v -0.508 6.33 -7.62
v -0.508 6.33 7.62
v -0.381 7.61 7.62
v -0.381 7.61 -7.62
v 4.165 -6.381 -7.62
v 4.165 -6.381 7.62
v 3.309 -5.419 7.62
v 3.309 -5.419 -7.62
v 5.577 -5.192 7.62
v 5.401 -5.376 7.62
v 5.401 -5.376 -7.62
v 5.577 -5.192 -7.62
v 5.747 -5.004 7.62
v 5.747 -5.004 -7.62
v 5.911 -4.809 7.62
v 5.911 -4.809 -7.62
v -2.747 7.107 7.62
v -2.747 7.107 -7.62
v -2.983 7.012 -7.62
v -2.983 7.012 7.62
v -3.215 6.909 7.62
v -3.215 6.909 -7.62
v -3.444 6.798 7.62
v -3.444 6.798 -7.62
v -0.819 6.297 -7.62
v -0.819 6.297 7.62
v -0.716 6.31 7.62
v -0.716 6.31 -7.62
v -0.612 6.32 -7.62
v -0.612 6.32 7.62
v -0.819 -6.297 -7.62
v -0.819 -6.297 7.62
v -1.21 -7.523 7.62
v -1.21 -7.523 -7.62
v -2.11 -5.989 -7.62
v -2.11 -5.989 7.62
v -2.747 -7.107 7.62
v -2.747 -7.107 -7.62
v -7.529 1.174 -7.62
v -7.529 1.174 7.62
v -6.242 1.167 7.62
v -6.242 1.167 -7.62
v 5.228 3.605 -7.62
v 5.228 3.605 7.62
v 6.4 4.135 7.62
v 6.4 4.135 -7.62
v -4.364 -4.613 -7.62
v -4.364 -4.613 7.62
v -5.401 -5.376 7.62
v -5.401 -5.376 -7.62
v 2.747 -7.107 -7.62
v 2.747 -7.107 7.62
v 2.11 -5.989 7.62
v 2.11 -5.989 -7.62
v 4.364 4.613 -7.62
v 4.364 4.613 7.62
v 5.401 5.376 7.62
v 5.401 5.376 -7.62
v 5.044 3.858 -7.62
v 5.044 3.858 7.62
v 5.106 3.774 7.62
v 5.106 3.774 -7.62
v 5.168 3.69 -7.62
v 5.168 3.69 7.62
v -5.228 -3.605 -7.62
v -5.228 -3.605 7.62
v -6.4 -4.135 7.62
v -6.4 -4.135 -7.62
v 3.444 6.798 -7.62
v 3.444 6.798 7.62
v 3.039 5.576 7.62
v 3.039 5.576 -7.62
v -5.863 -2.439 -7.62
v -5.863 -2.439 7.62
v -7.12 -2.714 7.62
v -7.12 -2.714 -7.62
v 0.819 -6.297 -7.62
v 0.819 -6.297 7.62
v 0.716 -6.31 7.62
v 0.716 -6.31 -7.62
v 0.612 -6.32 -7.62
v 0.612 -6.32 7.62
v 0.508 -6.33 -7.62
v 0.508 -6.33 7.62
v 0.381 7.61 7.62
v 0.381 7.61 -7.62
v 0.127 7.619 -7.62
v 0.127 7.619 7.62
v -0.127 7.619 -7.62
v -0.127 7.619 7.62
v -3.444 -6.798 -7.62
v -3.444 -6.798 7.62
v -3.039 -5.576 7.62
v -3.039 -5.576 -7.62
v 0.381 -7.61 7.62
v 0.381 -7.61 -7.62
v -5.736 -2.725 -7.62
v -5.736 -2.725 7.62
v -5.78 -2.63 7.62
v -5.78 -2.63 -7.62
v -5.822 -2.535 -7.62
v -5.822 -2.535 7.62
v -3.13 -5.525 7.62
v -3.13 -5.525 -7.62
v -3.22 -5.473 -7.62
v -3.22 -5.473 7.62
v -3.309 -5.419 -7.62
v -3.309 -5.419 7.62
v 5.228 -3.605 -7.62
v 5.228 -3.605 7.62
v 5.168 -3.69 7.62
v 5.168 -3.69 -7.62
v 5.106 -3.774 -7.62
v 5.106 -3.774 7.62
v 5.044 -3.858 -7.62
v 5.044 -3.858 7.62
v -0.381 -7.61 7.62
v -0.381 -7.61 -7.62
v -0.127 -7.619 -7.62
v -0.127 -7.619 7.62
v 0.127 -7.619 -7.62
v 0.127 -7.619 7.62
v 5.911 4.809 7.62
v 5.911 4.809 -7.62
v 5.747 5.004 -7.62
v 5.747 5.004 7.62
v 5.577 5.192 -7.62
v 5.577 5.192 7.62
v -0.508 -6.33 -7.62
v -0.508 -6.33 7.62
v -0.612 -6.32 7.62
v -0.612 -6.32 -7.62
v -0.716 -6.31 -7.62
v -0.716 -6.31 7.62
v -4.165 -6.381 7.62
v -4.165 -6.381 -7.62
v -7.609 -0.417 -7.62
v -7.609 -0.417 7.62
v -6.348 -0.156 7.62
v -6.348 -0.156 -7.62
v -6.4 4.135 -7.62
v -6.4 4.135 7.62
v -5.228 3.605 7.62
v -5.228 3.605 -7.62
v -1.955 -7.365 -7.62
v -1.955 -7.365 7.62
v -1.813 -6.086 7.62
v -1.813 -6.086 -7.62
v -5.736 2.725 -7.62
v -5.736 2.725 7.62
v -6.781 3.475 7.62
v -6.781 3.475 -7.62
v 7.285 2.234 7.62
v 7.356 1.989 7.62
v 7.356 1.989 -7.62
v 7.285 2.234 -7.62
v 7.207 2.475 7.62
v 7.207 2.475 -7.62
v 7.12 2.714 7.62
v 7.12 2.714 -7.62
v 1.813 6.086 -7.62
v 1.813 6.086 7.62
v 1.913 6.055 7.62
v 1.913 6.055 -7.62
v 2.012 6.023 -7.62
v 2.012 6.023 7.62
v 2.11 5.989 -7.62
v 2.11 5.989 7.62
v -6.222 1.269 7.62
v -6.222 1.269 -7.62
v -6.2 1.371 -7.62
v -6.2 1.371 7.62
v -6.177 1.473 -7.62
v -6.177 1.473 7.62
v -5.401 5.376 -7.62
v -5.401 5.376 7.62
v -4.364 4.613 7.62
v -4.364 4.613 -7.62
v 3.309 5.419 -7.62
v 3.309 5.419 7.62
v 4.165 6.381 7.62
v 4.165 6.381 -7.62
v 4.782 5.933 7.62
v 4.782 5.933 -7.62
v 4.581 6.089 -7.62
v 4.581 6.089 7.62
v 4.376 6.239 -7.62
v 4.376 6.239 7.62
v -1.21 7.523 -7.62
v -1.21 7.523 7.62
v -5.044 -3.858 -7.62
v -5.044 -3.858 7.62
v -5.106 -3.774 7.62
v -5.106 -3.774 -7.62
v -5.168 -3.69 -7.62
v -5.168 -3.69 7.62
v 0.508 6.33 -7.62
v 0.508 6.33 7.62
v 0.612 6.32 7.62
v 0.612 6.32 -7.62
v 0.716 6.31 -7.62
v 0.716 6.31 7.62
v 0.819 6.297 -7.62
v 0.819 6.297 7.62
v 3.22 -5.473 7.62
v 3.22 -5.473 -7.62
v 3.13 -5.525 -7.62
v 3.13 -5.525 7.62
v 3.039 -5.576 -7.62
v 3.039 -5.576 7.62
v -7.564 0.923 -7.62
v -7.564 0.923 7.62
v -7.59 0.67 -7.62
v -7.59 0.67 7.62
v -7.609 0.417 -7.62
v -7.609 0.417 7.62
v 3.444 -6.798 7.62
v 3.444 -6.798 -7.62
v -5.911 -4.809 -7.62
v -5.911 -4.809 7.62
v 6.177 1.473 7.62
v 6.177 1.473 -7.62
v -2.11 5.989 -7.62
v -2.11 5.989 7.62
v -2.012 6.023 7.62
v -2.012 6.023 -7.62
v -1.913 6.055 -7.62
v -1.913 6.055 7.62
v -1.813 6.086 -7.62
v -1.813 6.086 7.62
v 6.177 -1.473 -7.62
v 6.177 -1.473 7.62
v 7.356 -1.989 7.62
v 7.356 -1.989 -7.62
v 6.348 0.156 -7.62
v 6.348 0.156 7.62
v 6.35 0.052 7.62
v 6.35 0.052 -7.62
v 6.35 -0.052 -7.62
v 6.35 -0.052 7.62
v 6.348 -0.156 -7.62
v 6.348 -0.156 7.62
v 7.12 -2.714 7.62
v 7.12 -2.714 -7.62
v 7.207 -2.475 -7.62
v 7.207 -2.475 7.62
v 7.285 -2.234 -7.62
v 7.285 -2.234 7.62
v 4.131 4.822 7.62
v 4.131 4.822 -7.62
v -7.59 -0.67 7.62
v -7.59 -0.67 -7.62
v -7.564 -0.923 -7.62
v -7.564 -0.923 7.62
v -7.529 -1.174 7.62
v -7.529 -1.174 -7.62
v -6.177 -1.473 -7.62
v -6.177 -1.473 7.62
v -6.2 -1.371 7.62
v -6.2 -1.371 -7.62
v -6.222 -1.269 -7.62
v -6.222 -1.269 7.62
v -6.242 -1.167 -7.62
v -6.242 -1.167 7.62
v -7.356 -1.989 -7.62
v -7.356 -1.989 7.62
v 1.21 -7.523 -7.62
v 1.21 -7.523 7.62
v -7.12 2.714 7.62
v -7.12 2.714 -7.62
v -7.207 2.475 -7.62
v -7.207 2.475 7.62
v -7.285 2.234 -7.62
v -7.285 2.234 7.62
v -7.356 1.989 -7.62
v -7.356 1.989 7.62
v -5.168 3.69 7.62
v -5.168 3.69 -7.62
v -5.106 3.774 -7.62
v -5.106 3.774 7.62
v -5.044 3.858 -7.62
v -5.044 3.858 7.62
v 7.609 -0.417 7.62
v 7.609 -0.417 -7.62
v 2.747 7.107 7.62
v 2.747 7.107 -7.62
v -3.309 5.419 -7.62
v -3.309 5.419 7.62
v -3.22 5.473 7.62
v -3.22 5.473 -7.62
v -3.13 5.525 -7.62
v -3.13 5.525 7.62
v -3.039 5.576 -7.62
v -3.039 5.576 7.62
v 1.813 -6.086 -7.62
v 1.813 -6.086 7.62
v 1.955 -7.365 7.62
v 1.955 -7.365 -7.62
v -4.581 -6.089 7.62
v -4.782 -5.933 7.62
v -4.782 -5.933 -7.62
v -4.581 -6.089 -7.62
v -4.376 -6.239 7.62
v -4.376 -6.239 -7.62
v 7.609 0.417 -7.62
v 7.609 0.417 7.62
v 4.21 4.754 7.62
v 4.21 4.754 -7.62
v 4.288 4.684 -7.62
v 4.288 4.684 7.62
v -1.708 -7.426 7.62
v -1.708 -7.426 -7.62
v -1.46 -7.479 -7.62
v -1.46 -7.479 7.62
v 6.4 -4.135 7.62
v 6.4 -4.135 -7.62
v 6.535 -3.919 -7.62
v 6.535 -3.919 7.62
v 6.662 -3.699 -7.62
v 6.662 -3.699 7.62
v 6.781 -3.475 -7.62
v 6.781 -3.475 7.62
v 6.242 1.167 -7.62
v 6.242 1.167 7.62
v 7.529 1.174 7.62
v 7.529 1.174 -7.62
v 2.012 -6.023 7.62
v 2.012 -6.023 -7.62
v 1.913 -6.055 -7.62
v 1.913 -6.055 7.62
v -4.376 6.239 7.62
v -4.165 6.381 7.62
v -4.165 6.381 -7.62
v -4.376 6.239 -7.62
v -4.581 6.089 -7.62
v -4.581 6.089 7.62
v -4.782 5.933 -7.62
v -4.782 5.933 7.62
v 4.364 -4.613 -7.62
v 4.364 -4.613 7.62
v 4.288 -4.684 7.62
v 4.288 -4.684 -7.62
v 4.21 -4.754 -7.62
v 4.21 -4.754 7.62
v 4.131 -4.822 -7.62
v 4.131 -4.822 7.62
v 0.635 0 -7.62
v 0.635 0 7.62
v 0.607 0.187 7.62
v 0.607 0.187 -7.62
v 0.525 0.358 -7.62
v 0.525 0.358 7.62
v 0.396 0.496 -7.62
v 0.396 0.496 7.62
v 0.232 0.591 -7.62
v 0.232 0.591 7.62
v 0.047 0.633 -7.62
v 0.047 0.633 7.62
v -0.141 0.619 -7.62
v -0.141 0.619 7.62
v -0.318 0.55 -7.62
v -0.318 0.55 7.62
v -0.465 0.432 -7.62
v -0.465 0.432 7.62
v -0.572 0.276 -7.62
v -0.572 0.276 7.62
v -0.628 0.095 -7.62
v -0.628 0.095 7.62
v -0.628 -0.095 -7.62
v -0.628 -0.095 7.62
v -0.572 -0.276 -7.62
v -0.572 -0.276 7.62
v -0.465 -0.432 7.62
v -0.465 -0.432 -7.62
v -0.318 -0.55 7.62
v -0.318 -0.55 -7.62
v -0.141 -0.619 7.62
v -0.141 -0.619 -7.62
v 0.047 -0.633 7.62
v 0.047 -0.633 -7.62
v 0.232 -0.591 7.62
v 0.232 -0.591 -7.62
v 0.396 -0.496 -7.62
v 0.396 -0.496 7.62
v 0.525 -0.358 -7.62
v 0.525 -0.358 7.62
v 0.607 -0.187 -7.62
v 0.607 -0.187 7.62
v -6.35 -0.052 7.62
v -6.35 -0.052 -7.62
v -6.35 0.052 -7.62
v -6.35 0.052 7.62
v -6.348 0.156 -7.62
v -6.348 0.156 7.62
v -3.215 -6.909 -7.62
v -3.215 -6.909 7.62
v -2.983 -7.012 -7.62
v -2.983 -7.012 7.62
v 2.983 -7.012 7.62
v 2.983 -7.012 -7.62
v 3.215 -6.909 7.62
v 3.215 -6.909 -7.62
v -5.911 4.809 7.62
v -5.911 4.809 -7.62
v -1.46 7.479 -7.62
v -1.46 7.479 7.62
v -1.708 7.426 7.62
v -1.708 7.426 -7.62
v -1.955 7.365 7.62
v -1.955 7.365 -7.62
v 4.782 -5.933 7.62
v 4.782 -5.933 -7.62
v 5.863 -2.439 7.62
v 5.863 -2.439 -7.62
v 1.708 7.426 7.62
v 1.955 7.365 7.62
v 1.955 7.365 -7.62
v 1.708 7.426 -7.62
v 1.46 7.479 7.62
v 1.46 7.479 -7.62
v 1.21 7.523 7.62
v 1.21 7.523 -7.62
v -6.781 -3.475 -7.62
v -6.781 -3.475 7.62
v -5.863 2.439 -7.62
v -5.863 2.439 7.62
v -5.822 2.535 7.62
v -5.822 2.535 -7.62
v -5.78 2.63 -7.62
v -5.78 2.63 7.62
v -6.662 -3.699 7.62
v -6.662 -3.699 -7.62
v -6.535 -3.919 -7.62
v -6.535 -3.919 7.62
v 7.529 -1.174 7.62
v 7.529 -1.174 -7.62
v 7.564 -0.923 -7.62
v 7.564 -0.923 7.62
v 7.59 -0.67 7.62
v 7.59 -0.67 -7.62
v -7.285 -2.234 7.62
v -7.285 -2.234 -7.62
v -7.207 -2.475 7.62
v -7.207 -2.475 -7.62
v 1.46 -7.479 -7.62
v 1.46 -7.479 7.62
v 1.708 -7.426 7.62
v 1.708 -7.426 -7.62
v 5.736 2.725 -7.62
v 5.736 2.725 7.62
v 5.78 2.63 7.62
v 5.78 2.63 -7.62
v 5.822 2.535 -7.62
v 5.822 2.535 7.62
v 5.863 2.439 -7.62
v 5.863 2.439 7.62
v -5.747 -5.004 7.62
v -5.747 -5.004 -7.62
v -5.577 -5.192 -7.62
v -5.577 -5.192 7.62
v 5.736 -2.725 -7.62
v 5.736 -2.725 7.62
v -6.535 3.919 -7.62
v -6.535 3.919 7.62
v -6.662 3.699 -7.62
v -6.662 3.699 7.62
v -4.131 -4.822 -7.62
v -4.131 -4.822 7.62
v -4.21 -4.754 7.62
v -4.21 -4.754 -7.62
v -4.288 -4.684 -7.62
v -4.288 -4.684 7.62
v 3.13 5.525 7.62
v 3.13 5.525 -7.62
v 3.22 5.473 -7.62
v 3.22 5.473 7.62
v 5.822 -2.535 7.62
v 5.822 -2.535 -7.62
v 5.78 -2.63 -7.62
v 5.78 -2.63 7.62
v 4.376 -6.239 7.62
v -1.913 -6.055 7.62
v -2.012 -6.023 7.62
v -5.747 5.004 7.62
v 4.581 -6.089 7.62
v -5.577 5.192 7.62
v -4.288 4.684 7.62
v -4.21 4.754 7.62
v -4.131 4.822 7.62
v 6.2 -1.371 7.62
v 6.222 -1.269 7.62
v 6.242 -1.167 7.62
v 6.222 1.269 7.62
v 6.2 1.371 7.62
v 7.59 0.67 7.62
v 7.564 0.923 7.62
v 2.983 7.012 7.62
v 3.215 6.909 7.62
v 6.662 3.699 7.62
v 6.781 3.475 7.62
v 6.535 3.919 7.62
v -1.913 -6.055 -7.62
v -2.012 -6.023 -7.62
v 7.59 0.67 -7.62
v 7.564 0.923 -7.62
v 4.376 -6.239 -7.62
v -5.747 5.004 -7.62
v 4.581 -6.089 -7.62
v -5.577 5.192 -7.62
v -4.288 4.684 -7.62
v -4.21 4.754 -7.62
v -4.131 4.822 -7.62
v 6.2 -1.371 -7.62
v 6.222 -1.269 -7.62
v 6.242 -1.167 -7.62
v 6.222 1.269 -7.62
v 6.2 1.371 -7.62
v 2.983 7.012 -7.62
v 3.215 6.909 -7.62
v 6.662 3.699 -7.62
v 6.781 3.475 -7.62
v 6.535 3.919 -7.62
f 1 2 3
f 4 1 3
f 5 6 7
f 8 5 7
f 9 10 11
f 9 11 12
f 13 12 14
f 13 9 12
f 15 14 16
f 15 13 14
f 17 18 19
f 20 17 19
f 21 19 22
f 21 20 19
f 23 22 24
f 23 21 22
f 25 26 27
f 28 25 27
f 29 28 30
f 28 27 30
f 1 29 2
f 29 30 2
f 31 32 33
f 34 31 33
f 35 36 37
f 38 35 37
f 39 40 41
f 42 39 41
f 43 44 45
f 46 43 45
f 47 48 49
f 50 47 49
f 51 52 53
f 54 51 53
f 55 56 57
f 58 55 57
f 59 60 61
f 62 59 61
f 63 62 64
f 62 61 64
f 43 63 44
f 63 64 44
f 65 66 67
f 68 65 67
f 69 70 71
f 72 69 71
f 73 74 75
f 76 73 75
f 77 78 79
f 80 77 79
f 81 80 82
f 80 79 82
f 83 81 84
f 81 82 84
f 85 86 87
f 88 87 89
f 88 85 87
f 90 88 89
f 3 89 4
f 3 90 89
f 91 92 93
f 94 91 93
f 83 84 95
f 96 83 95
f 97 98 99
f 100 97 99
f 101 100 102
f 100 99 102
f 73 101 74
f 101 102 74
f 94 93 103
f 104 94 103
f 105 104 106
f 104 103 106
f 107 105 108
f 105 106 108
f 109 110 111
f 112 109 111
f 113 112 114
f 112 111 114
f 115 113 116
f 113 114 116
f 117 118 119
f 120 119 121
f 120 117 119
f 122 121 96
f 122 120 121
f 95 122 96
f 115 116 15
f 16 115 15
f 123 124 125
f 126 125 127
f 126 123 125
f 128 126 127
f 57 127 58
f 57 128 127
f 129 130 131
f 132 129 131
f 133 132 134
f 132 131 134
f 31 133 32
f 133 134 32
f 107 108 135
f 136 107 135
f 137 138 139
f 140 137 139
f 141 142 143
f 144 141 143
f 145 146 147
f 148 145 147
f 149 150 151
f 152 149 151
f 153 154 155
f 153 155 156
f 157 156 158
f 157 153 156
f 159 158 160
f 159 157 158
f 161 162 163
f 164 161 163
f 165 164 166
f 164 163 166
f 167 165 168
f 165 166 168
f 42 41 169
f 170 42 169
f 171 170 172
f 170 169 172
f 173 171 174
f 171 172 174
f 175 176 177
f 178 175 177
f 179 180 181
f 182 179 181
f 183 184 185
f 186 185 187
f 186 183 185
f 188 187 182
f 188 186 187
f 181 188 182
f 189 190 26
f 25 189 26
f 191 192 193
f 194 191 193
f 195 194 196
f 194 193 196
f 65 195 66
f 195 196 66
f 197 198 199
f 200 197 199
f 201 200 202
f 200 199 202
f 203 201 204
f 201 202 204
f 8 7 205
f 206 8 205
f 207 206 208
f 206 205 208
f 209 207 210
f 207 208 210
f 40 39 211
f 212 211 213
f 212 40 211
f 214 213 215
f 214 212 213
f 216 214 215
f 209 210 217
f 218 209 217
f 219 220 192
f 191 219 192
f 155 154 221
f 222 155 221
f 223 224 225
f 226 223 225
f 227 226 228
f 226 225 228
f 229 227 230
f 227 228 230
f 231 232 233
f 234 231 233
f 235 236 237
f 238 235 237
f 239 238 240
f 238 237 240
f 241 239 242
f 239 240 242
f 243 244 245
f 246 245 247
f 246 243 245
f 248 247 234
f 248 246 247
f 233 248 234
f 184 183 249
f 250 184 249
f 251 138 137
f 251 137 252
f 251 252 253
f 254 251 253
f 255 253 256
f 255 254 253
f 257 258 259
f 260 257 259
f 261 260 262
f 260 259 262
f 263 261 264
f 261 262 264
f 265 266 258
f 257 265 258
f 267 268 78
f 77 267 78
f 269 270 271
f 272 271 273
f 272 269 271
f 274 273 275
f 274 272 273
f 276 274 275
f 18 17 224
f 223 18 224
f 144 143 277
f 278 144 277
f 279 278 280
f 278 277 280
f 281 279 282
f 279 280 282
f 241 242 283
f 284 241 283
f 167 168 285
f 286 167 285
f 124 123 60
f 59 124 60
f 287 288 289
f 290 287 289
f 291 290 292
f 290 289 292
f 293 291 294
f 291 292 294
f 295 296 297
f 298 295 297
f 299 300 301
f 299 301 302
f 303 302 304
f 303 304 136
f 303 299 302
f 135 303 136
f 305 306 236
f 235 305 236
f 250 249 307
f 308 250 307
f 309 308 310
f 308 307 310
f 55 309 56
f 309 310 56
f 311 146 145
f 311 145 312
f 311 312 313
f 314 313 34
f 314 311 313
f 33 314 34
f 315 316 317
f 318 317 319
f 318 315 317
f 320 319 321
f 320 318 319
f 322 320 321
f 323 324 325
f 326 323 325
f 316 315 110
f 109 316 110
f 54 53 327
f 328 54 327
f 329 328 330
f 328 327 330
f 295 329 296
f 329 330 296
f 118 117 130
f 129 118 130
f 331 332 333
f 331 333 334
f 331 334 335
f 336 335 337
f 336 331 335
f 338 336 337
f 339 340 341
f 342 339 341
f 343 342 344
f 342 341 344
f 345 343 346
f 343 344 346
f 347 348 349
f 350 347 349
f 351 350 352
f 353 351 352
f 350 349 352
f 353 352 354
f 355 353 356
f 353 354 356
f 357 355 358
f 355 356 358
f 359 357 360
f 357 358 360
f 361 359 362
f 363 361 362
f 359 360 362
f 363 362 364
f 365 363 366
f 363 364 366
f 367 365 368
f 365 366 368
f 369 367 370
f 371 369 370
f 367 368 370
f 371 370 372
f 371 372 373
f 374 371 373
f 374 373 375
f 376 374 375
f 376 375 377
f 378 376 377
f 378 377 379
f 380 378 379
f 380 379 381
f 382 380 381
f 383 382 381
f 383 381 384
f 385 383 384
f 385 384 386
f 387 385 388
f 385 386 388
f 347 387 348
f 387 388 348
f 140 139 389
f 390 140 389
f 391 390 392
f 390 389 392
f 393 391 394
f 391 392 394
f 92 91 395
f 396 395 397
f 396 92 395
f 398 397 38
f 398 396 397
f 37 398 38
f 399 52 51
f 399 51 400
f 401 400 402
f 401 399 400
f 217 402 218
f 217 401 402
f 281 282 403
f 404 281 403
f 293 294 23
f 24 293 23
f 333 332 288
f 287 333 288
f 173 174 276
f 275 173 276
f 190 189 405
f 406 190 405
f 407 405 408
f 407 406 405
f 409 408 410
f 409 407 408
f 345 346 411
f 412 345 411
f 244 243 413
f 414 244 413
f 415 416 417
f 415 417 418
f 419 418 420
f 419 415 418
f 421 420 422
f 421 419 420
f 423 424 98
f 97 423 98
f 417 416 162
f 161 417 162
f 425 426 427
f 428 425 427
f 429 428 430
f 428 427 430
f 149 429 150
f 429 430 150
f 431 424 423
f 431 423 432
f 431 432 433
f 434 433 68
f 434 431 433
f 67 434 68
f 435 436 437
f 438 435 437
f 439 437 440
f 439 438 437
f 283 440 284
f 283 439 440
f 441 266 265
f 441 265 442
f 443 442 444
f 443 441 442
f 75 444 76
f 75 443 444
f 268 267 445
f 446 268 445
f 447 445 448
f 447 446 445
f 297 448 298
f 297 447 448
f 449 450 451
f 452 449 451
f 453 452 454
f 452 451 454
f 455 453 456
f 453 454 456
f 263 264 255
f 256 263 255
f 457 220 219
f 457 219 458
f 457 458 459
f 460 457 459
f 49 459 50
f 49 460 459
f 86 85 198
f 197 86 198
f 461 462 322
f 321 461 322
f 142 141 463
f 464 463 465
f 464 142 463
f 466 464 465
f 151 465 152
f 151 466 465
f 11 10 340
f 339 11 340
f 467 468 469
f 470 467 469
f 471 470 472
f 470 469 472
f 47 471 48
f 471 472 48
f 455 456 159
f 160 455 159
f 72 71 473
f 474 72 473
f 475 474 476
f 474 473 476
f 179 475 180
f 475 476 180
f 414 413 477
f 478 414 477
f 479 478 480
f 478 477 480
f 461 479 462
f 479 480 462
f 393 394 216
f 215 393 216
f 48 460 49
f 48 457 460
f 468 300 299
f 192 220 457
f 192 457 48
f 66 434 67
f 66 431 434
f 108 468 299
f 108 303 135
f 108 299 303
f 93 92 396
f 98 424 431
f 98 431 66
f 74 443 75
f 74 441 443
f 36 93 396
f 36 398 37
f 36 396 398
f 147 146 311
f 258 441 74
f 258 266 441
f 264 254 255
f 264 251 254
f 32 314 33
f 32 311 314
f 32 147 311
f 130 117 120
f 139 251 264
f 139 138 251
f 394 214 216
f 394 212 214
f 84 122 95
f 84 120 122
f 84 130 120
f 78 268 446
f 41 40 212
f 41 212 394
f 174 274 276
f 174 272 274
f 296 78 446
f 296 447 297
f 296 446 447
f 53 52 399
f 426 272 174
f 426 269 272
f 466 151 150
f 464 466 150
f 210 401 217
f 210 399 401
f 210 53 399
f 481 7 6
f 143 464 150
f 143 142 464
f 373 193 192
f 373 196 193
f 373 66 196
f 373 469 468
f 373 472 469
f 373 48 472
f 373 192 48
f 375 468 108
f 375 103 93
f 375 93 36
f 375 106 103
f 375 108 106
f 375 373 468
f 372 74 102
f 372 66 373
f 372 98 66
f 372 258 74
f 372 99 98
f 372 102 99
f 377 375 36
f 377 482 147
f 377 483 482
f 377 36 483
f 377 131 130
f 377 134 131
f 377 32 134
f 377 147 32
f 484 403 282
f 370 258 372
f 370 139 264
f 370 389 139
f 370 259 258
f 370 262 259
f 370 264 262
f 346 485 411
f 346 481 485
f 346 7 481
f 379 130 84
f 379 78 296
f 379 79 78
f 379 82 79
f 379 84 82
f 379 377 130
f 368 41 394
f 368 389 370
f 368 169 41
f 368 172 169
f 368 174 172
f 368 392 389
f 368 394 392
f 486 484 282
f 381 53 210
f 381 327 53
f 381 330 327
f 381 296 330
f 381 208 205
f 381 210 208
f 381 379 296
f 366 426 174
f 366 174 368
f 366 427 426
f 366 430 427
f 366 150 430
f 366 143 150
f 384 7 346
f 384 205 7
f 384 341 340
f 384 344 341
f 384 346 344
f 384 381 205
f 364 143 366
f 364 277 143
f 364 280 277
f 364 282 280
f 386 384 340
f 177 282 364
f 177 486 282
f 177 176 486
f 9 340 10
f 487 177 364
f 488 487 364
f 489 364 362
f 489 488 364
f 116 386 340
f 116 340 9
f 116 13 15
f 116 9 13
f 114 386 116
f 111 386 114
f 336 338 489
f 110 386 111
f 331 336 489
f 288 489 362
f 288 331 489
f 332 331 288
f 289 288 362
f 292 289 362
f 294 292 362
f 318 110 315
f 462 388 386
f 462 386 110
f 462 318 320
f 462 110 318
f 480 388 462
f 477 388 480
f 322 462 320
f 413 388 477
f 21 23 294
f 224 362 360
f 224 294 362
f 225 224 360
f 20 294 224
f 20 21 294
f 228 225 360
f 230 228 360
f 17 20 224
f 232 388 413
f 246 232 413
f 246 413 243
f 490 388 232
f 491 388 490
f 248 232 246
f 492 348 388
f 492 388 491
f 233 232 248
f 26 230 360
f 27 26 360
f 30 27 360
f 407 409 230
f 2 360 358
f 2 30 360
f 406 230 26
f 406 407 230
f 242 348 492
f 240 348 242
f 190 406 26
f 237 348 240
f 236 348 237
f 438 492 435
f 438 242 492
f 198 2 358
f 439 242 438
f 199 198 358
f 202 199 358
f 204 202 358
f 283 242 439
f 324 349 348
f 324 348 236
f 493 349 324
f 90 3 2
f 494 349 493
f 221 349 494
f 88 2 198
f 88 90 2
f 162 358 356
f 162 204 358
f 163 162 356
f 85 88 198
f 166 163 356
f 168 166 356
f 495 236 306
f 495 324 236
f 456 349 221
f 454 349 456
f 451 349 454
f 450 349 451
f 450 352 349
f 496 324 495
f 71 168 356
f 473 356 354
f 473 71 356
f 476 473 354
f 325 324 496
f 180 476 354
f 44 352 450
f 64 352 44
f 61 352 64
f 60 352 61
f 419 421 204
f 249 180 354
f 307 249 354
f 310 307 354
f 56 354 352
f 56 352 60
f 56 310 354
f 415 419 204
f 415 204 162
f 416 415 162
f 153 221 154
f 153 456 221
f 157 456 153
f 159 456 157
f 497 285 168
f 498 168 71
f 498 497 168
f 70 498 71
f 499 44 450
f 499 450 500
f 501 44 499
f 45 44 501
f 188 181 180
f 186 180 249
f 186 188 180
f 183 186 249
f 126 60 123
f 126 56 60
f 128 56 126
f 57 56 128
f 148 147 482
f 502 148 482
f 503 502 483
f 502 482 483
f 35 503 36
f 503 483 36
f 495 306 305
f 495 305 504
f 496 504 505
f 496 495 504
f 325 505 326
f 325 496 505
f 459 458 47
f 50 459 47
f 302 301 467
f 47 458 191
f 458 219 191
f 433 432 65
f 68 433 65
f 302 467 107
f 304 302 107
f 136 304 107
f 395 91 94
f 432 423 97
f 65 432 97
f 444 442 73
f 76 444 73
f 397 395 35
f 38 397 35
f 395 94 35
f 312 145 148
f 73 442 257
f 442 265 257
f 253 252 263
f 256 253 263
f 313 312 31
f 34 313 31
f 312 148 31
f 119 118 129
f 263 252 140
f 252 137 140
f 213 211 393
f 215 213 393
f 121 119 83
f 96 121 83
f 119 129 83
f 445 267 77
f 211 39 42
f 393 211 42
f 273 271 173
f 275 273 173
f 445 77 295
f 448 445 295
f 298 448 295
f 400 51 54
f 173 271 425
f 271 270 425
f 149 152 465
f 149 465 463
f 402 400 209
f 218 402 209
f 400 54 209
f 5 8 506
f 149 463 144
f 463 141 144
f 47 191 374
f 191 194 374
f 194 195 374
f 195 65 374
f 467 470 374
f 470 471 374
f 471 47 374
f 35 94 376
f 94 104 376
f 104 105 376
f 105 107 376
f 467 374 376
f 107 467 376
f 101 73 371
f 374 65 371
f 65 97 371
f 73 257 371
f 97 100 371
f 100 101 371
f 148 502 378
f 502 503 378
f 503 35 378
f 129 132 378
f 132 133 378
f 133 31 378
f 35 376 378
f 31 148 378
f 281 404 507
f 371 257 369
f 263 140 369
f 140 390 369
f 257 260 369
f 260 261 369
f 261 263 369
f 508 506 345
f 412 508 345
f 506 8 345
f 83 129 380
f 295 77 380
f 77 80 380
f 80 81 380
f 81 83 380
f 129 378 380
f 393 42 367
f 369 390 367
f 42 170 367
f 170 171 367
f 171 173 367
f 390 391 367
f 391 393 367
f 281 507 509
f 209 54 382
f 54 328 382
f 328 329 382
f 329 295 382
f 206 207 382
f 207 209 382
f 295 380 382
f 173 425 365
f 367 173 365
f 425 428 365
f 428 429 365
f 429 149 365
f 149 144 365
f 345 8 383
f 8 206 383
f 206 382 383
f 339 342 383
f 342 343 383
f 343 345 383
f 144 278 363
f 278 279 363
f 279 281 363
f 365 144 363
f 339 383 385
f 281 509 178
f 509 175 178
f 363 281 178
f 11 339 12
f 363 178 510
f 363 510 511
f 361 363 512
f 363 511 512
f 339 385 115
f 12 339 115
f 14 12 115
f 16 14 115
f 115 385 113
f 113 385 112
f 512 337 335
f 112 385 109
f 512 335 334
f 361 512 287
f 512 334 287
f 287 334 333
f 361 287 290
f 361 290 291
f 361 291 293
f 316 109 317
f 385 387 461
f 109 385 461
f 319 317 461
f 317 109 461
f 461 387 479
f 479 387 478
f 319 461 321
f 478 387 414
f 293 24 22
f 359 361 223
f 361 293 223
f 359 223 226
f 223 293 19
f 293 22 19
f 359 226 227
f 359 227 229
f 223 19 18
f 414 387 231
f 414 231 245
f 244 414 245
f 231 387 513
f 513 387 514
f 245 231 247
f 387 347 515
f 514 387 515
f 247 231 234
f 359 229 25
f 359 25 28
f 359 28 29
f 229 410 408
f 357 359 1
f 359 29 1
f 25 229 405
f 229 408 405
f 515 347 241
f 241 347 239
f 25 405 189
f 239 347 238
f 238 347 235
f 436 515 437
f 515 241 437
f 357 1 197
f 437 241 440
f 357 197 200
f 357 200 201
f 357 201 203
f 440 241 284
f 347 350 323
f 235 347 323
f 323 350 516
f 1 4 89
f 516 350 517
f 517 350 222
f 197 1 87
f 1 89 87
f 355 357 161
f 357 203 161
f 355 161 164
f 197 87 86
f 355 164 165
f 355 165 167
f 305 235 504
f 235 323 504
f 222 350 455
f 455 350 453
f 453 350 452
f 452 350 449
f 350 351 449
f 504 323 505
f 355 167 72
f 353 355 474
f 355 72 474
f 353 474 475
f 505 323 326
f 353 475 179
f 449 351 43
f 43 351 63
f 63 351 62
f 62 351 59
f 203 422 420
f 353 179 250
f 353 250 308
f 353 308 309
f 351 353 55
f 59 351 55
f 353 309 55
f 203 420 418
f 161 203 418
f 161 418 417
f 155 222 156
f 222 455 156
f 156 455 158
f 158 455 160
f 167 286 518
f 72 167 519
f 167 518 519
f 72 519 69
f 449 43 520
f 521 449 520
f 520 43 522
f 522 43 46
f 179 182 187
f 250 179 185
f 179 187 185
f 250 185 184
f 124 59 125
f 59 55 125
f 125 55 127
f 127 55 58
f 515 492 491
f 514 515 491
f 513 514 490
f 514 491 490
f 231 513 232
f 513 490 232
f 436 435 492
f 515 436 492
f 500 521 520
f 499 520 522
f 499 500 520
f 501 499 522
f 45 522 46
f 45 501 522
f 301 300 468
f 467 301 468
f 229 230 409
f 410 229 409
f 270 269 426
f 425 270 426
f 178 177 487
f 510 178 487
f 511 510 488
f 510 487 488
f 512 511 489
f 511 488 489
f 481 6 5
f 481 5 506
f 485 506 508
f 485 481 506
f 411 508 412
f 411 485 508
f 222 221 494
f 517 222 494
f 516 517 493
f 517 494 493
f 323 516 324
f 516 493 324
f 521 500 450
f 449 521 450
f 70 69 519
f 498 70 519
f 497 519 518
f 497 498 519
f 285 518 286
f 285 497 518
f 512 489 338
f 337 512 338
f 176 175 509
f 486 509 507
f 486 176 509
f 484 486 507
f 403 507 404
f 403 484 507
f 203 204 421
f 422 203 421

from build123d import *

# Parameters (mm, degrees)
F0_R            = 7.62
F1_DEPTH        = 7.62
F2_R            = 0.635
F3_DEPTH        = 15.24
F5_DEPTH        = 15.24
F5_COPIES_COUNT = 30


# Not quite as in the source:
# - a pattern or mirror of a feature is missing from the dataset's text; its kind, count and spacing are read off the source's solid


with BuildPart() as f1:
    # F0 (on Top) → F1 (new body, symmetric)
    with BuildSketch(Plane.XY):
        Circle(F0_R)
    extrude(amount=F1_DEPTH, both=True)

    # F2 (on face) → F3 (cut, through all)
    with BuildSketch(Plane.XY.offset(7.62)):
        Circle(F2_R)
    extrude(amount=-F3_DEPTH, mode=Mode.SUBTRACT)

    # F4 (on face) → F5 (cut, through all)
    with BuildSketch(Plane.XY.offset(7.62)):
        with BuildLine():
            ThreePointArc((1.20963125, 7.5233763856), (0.7965068901, 7.5782568427), (0.381, 7.6104690394))
            Line((0.381, 7.6104690394), (0.508, 6.3296473835))
            ThreePointArc((0.508, 6.3296473835), (0.6637557417, 6.3152140356), (0.8191087086, 6.2969485406))
            Line((0.8191087086, 6.2969485406), (1.20963125, 7.5233763856))
        make_face()
    f5 = extrude(amount=-F5_DEPTH, mode=Mode.SUBTRACT)

    # F5_copies: F5 ×30 about axis
    f5_copies_axis = Axis((0, 0, 0), (0, 0, 1))
    for i in range(1, F5_COPIES_COUNT):
        add(f5.rotate(f5_copies_axis, i * 360 / F5_COPIES_COUNT), mode=Mode.SUBTRACT)


solid = f1.part
